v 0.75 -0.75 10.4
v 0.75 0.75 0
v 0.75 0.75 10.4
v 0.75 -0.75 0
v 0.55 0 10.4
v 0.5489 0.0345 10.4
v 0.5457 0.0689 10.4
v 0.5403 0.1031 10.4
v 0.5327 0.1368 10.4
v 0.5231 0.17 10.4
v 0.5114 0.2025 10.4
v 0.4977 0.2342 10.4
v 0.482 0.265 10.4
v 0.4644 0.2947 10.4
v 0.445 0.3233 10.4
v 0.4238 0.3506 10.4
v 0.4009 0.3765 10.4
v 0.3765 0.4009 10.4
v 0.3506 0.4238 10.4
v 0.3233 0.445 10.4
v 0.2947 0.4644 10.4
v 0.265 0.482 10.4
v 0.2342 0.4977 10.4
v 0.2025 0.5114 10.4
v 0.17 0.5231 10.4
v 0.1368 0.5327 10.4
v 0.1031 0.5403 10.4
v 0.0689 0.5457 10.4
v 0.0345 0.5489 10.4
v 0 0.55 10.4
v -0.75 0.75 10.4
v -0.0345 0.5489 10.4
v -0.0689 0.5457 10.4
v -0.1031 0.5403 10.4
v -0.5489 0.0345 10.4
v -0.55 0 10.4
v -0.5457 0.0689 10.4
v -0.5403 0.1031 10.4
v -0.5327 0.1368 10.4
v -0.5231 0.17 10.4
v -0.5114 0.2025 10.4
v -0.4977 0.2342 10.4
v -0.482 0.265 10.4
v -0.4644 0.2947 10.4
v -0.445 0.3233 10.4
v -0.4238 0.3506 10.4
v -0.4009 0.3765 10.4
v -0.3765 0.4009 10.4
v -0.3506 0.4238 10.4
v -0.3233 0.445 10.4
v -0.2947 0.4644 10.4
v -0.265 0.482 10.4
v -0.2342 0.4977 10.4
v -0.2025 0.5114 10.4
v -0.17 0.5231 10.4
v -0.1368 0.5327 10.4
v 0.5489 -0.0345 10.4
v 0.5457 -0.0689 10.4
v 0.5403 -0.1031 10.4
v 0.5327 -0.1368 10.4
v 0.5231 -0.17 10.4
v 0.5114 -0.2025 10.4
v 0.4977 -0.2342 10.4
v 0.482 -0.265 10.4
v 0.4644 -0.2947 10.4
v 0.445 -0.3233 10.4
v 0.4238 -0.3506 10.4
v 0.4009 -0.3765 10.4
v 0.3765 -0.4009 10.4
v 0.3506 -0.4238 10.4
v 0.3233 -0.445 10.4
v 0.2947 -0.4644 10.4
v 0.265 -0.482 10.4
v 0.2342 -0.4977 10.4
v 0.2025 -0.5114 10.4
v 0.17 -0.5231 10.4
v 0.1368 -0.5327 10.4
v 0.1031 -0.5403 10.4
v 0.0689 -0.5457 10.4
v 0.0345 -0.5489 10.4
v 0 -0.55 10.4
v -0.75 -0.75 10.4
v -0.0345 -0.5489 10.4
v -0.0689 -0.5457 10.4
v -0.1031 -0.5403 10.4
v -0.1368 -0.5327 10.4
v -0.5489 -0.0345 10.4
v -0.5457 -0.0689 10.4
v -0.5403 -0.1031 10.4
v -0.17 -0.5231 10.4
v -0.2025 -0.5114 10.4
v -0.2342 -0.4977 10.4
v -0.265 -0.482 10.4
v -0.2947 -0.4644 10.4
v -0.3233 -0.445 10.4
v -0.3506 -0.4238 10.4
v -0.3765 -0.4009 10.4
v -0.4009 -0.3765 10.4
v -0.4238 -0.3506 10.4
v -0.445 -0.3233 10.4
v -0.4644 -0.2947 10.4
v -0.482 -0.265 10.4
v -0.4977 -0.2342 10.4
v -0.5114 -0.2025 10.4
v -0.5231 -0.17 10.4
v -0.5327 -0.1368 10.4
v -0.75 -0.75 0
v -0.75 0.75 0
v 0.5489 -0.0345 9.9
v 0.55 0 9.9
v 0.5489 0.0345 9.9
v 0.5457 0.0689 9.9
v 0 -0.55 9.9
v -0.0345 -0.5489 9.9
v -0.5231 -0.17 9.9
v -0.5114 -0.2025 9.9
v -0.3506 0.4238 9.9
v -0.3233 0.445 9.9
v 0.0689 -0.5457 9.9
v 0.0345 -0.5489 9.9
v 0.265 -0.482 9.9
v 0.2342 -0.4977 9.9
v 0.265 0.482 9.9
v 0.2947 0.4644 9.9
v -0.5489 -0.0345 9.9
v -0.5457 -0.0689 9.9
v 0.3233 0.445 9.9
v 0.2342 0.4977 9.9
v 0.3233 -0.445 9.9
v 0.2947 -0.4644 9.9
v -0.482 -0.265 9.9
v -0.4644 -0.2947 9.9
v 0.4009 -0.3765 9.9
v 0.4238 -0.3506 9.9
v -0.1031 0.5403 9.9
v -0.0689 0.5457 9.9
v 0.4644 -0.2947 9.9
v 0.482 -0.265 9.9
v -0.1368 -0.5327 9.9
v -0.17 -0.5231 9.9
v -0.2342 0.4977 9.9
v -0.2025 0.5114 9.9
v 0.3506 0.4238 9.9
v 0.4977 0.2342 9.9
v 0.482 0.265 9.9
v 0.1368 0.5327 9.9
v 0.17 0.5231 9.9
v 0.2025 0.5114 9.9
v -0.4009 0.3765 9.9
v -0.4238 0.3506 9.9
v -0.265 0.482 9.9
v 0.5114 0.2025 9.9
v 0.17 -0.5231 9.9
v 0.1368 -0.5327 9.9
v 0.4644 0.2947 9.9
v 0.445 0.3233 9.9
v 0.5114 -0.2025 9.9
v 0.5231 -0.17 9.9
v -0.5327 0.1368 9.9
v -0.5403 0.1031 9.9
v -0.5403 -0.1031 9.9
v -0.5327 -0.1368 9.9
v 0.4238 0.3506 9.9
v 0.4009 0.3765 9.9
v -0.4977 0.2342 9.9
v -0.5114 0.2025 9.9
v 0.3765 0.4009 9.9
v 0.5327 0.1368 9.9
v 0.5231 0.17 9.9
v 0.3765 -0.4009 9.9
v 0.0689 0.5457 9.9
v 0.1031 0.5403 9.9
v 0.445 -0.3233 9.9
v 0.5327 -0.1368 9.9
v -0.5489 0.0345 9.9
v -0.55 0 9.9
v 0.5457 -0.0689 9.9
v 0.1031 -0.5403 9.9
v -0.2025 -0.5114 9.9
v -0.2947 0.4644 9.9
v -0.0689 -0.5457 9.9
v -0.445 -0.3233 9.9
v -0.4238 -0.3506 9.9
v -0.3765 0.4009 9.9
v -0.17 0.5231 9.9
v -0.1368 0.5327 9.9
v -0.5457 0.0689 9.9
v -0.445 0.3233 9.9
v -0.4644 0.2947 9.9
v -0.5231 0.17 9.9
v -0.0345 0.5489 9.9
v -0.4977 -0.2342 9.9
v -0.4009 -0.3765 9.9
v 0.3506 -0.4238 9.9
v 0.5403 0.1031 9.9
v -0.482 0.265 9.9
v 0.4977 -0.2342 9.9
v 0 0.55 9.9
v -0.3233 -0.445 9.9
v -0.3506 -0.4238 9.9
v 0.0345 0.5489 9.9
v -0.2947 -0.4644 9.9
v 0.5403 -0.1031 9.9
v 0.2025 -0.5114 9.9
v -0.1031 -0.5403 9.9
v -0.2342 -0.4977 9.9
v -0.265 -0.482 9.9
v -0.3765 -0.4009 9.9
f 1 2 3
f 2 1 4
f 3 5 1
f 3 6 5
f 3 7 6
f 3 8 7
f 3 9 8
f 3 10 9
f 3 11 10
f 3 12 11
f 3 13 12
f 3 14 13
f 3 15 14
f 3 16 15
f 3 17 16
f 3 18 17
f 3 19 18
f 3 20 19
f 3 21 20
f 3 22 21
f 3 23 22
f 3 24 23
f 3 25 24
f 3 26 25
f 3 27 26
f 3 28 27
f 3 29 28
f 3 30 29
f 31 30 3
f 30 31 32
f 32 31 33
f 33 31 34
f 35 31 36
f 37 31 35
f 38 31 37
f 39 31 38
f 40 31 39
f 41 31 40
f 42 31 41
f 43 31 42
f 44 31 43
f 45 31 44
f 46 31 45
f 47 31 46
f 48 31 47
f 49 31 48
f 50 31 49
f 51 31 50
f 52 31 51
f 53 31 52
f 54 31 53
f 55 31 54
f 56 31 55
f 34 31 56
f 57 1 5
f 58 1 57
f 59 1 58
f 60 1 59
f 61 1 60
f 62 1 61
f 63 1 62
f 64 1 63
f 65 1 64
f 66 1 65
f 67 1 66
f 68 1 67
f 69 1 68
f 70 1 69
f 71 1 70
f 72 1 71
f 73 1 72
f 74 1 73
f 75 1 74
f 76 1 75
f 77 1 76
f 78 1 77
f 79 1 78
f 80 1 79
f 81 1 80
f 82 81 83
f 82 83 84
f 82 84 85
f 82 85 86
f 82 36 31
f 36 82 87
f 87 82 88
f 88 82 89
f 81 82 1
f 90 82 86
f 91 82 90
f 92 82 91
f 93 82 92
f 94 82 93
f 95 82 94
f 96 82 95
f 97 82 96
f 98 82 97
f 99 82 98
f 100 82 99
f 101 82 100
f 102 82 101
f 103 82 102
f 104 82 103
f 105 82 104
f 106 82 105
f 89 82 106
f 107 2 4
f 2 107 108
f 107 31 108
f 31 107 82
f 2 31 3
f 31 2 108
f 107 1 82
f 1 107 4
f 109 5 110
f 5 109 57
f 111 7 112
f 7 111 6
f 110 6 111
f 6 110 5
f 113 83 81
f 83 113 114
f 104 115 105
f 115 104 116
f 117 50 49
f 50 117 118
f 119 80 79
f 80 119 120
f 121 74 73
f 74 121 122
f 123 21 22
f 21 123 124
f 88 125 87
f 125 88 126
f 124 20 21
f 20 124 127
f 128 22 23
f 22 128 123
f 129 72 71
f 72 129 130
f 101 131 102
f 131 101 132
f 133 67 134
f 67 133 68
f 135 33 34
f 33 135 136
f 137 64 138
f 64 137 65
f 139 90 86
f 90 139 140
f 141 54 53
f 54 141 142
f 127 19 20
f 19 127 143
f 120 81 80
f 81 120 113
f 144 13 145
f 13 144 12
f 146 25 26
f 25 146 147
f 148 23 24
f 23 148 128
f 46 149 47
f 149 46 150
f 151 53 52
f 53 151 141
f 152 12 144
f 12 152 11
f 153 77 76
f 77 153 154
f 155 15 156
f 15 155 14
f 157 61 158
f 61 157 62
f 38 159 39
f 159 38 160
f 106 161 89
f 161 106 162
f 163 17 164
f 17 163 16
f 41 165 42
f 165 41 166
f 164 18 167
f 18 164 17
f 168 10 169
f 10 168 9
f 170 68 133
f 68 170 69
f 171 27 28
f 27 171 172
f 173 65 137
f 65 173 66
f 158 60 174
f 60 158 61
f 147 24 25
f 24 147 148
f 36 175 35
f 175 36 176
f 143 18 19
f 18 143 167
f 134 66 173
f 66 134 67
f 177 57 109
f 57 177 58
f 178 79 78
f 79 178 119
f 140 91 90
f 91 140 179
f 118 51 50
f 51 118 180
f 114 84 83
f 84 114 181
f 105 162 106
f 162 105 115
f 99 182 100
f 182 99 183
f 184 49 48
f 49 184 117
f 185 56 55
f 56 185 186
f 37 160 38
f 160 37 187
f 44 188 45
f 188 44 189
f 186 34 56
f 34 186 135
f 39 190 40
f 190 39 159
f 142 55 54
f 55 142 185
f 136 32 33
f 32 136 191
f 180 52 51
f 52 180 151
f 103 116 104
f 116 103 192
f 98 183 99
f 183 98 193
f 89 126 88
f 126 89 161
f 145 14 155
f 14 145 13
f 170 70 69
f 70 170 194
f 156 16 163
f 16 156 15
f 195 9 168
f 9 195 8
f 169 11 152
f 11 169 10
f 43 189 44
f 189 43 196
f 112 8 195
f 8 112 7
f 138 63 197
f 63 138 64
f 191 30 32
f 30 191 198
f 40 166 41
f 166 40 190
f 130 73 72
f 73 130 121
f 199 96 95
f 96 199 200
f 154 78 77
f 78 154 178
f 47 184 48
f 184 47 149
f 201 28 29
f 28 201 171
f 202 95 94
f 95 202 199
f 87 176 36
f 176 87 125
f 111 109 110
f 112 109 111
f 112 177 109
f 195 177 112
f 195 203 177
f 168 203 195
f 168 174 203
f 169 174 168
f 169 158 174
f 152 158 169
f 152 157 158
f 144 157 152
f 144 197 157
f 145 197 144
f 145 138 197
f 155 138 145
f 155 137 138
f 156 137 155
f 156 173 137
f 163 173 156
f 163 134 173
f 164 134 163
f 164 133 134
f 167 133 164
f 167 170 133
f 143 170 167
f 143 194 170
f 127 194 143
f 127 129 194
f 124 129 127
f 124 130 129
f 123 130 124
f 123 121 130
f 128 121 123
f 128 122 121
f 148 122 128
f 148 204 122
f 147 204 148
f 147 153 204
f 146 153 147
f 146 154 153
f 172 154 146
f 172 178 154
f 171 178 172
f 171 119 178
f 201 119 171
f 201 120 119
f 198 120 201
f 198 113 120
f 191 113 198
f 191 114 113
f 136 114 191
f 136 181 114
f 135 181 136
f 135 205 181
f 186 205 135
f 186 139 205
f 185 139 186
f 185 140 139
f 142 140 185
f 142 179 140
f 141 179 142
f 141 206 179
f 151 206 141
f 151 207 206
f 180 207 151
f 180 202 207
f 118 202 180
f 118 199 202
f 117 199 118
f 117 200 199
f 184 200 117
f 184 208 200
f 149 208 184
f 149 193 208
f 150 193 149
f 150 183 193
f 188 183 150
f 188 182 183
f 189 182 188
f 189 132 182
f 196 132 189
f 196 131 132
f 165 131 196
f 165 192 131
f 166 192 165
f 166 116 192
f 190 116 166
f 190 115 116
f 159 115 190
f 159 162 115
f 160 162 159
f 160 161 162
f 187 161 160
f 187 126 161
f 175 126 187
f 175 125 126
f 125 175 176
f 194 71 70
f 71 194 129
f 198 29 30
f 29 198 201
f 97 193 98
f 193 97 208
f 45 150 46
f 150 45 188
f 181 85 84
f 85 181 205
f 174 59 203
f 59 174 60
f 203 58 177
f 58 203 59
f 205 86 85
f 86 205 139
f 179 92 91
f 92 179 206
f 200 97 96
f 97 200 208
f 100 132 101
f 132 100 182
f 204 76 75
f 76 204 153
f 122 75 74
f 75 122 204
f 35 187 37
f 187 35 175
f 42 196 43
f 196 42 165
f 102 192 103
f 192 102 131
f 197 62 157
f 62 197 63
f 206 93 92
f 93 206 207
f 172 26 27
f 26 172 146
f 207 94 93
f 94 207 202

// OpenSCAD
difference(){
    translate([-.75, -.75, 0 ]){cube([1.5, 1.5, 10.4]);}
    translate([0,0,9.9]){
        cylinder(3, .55, .55, $fn = 100);
    }
}
